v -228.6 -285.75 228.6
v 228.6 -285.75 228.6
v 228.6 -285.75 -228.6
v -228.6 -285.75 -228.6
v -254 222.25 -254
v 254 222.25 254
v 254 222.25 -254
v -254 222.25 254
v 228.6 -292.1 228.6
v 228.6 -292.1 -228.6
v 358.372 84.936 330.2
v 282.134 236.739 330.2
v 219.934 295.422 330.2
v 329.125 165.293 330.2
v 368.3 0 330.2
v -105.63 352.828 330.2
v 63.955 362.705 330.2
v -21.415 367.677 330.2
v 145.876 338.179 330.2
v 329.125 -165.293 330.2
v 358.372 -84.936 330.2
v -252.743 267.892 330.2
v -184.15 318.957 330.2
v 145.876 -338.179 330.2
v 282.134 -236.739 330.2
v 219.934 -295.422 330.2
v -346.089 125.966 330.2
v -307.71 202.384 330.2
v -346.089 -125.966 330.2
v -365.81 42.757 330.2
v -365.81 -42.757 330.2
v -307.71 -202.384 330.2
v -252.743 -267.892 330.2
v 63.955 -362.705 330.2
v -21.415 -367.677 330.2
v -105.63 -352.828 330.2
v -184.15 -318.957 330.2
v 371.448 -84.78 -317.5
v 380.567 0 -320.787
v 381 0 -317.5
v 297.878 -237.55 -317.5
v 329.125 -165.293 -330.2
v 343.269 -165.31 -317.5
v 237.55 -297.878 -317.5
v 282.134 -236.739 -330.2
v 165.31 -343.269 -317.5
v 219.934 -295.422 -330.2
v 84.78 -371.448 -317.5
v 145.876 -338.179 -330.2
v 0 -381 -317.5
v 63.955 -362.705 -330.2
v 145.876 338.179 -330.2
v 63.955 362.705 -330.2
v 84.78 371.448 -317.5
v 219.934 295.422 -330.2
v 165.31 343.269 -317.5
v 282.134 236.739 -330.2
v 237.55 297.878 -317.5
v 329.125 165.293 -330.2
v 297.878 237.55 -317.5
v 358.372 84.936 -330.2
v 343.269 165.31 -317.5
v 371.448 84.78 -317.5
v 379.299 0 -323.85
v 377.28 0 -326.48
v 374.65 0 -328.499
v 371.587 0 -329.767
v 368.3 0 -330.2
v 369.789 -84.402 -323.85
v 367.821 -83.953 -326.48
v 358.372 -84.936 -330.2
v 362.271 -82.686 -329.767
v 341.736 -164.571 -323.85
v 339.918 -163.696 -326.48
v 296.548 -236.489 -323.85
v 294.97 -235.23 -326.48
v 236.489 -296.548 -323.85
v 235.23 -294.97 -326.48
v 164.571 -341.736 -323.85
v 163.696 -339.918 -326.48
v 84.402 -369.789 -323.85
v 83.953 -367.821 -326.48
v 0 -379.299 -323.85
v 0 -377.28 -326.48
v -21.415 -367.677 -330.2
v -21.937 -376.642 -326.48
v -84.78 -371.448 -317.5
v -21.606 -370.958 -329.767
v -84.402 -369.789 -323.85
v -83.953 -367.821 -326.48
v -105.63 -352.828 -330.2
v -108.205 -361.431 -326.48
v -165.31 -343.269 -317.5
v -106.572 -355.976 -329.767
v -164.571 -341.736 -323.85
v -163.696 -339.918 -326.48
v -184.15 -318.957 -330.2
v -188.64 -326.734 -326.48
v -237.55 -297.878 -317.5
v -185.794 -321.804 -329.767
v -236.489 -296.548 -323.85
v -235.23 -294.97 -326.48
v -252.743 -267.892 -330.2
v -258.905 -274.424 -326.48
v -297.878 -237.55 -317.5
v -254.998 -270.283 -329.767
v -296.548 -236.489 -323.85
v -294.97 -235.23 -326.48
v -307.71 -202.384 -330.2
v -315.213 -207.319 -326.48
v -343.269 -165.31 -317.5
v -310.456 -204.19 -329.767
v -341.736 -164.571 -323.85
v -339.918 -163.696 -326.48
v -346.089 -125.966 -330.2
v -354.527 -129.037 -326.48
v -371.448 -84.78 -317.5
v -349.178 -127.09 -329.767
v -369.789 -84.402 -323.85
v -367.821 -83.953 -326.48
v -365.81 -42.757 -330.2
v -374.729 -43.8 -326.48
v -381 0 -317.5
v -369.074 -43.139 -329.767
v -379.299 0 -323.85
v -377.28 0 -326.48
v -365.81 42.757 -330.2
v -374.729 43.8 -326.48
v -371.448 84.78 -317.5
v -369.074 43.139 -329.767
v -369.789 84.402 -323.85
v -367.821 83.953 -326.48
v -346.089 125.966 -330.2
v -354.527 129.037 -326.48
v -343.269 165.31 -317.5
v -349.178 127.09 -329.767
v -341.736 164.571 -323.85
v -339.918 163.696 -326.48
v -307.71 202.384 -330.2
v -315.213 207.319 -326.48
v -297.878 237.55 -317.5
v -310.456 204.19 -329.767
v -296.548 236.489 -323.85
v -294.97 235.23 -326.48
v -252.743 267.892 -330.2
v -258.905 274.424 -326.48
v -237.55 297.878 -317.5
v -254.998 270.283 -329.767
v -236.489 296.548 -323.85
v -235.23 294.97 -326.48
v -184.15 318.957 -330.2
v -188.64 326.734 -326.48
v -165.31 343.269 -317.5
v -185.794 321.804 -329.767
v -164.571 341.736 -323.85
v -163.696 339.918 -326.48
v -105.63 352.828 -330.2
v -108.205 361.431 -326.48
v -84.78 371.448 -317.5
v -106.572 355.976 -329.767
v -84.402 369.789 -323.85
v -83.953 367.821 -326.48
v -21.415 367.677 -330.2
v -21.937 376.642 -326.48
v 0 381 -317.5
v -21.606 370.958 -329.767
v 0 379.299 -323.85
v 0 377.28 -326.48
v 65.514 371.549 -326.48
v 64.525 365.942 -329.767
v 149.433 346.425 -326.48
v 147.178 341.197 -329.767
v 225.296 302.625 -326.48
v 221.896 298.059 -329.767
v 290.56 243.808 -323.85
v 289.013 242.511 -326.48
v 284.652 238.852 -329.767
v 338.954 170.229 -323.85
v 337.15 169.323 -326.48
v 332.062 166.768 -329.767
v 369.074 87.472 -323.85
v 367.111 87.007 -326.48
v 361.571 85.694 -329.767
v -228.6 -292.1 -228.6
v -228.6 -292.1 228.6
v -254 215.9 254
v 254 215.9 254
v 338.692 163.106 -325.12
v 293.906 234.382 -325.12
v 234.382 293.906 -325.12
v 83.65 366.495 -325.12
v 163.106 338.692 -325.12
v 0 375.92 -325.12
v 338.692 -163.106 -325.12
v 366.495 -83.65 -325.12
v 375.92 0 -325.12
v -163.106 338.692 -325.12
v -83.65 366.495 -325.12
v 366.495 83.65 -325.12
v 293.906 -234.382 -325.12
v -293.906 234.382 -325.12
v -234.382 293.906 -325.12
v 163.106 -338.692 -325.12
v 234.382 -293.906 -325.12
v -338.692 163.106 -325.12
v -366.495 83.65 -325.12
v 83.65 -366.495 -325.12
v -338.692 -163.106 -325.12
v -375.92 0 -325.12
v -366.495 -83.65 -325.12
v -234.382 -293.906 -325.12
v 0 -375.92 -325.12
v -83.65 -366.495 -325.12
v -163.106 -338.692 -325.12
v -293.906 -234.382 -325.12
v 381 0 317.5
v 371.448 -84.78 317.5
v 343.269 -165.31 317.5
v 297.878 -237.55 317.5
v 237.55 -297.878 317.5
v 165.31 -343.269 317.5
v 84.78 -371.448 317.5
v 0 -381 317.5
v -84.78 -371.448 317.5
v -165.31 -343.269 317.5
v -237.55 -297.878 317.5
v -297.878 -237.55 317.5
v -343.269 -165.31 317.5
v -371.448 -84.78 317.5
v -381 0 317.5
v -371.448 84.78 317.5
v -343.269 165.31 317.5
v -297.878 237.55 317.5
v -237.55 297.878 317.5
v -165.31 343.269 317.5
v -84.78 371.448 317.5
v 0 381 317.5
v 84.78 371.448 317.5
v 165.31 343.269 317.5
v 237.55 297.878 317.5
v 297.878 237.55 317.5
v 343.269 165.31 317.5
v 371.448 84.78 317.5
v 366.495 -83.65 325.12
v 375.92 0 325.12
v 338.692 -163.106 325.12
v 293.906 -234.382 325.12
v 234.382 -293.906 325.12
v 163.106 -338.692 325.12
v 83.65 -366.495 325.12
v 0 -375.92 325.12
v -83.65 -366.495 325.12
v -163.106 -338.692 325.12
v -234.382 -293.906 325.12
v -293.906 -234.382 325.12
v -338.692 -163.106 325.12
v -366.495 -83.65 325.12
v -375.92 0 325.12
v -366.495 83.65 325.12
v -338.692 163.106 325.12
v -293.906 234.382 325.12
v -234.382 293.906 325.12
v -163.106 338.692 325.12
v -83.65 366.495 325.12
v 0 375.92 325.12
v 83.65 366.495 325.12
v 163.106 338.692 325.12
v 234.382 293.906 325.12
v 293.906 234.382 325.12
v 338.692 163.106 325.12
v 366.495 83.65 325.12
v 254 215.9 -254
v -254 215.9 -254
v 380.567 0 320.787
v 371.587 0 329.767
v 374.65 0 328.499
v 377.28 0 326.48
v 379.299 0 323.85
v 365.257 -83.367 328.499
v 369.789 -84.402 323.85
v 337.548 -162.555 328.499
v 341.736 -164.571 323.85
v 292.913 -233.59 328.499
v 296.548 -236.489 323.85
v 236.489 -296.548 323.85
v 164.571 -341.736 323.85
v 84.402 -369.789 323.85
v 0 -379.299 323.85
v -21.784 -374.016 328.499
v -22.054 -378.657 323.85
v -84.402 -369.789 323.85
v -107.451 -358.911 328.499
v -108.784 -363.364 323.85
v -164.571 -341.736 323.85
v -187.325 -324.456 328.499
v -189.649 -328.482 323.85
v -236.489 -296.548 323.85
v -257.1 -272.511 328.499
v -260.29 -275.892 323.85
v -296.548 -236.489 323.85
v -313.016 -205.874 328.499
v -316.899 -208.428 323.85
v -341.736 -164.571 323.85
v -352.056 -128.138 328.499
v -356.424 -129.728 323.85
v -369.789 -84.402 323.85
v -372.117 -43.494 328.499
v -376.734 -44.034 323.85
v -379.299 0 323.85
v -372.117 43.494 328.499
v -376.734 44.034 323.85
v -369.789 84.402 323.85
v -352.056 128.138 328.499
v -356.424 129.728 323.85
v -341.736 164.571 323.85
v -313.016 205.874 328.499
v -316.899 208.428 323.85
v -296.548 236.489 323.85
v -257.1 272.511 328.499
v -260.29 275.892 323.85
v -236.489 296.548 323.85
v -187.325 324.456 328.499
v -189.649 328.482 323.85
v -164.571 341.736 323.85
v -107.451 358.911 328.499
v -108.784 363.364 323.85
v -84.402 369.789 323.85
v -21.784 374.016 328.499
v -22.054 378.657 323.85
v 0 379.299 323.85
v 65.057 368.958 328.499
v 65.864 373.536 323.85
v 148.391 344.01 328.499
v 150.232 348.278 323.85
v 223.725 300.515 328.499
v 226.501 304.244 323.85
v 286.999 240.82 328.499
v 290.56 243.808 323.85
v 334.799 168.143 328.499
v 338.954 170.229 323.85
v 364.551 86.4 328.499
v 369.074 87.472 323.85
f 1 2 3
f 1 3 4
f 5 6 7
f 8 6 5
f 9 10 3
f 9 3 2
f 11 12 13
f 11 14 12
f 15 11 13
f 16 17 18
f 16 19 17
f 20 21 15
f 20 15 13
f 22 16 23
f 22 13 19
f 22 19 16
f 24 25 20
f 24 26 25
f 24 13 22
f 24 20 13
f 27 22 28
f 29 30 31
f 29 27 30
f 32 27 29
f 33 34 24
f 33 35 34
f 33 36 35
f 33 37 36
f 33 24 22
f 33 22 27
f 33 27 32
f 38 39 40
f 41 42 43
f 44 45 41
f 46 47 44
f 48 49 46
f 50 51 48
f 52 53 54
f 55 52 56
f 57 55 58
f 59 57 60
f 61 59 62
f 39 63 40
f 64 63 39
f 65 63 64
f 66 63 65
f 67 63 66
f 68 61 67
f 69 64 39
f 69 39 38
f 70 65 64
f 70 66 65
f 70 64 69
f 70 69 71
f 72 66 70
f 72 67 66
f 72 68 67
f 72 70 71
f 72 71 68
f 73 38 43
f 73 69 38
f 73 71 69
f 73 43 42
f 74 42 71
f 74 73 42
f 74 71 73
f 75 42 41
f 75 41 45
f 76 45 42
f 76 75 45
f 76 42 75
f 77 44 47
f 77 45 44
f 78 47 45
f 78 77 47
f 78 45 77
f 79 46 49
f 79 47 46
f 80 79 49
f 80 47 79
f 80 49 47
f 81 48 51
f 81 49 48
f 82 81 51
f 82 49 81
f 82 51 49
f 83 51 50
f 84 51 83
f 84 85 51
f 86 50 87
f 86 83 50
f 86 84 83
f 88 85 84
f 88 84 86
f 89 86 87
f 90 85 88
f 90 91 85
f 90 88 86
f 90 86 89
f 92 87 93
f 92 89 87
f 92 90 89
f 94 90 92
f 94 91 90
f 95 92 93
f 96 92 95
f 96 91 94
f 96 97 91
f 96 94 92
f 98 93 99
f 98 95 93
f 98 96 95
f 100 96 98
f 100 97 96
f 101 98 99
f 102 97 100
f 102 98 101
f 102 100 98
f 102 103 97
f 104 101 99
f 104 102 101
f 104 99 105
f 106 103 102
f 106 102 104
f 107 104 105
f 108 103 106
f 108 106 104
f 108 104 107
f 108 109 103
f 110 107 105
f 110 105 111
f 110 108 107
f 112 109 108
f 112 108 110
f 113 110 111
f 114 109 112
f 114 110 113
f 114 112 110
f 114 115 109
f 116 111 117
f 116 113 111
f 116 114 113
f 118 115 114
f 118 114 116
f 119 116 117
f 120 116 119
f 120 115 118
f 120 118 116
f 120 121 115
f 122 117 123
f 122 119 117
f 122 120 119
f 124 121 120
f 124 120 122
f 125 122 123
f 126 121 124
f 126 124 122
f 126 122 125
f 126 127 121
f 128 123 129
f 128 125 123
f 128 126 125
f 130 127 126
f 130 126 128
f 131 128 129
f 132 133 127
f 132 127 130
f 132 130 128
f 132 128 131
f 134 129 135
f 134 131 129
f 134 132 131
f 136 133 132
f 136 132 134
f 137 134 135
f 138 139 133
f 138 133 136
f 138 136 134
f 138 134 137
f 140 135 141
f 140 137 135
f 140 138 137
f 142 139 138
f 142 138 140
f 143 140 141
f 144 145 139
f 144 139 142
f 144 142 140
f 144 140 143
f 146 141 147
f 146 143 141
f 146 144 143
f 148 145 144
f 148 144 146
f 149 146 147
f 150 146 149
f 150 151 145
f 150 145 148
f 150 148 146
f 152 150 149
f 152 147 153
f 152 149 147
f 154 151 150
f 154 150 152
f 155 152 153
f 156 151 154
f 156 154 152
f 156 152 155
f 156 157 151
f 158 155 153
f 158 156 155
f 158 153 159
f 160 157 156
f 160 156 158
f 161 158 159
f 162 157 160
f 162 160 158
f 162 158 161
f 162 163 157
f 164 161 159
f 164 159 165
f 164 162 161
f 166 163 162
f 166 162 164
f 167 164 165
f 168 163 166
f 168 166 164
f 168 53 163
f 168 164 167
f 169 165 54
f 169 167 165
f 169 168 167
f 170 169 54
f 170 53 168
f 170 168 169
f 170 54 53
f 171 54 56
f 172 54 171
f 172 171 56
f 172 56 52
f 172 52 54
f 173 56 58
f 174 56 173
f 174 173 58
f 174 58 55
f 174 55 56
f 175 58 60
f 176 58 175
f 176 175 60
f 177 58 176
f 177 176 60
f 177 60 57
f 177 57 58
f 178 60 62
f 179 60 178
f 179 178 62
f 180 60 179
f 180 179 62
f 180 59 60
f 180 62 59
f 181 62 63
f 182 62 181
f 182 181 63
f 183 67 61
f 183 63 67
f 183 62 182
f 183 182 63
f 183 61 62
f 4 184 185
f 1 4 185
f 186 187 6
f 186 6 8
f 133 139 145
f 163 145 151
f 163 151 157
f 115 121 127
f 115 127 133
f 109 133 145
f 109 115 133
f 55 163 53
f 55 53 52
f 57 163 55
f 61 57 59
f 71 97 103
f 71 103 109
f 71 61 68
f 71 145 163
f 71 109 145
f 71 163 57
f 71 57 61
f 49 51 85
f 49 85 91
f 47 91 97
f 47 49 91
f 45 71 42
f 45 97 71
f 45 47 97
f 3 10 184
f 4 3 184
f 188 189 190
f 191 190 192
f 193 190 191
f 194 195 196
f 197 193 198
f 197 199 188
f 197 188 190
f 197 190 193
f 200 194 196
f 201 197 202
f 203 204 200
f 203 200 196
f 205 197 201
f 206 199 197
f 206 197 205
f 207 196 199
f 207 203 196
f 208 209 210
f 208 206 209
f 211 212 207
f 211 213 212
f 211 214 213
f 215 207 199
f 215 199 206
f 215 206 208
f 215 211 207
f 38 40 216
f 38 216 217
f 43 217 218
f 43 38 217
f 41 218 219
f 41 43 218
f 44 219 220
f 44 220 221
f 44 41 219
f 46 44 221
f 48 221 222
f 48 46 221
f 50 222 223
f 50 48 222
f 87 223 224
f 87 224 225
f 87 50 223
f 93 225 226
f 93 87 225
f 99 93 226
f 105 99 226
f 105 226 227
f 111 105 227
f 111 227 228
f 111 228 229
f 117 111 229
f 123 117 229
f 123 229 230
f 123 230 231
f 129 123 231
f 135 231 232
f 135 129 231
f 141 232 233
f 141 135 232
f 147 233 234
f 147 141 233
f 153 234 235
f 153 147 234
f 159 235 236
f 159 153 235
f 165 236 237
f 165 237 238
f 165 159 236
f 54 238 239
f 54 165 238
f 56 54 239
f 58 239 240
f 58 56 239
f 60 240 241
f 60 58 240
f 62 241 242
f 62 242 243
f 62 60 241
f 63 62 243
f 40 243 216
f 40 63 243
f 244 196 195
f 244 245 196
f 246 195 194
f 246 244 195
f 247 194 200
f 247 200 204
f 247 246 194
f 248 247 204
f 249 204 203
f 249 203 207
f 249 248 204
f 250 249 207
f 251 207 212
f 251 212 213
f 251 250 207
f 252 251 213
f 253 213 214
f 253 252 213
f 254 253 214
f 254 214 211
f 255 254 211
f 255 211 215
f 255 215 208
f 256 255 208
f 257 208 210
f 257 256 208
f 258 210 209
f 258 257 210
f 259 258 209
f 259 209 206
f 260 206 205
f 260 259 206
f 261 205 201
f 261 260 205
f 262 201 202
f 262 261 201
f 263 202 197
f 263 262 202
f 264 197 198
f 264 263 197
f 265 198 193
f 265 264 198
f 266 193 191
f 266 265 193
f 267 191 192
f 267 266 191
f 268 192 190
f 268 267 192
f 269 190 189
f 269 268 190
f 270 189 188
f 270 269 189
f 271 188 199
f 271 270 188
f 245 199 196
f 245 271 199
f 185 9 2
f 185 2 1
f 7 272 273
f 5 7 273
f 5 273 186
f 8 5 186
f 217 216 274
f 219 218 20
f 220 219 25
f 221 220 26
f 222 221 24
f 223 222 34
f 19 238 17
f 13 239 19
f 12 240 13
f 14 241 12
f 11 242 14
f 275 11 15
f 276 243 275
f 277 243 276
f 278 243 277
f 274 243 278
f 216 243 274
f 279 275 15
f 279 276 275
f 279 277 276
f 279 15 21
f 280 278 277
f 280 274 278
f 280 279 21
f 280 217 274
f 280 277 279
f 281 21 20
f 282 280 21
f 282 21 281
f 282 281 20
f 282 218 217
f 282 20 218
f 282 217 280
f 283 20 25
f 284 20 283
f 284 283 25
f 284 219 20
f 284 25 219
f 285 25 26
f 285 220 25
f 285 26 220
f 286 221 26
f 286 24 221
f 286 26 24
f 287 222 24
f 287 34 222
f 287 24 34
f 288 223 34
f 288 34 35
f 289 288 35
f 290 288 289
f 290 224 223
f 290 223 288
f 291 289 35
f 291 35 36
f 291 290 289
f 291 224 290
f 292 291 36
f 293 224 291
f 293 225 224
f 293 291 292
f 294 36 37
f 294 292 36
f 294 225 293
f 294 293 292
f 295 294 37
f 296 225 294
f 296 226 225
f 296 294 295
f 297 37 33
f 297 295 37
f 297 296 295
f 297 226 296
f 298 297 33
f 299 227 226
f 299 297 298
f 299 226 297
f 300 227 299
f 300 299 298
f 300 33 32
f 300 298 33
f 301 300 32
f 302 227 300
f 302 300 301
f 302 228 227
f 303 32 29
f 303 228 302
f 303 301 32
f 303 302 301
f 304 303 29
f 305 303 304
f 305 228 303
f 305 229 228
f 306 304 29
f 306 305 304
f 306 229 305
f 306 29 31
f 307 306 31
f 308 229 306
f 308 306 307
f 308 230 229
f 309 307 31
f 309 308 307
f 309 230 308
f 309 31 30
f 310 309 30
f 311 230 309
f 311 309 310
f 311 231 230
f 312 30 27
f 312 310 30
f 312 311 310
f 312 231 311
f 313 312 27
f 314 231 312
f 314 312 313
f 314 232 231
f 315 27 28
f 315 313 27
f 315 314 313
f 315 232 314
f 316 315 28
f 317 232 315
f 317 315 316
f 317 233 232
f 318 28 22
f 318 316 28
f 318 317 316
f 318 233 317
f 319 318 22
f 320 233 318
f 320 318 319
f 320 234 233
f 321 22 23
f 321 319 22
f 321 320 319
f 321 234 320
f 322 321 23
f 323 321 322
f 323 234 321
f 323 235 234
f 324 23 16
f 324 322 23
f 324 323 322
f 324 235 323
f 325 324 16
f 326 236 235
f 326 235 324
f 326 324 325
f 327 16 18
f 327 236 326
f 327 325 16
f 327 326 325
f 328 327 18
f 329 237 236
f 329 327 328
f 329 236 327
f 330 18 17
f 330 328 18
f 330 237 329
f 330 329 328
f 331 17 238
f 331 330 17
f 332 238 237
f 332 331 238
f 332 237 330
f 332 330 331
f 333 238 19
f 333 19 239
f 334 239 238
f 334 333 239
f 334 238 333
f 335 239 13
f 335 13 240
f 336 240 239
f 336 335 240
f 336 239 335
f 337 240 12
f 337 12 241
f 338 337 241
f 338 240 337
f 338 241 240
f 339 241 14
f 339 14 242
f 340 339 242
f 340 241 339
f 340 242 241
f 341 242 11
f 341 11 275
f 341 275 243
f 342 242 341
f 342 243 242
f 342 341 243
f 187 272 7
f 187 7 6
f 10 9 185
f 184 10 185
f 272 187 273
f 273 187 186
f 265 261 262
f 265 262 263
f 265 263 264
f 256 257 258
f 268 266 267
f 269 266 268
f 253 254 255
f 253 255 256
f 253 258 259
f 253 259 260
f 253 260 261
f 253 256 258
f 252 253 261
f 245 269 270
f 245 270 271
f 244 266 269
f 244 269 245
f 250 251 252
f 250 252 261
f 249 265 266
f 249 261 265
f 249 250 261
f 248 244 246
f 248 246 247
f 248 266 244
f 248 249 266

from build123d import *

# Parameters (mm, degrees)
FILLET1_R           = 12.7
SKETCH4_W           = 508
SKETCH4_H           = 508
BOSS_EXTRUDE1_DEPTH = 6.35
SKETCH5_W           = 457.2
SKETCH5_H           = 457.2
BOSS_EXTRUDE2_DEPTH = 6.35


with BuildPart() as part:
    # Sketch2 → Revolve1 (revolve)
    with BuildSketch(Plane(origin=(0, 0, 0), x_dir=(0, 0, -1), z_dir=(1, 0, 0)), mode=Mode.PRIVATE) as revolve1_sk:
        Polygon((-330.2, 0), (-330.2, 381), (330.2, 381), (330.2, 0), (325.12, 0), (325.12, 375.92), (-325.12, 375.92), (-325.12, 0), align=None)
    revolve(revolve1_sk.sketch.rotate(Axis((0, 0, 330.2), (0, 0, -1)), 90), axis=Axis((0, 0, 330.2), (0, 0, -1)))

    # Fillet1
    fillet1_edges = [part.edges().sort_by_distance(p)[0] for p in [
        (-381, 0, 330.2),
        (-381, 0, -330.2),
    ]]
    fillet(fillet1_edges, radius=FILLET1_R)


with BuildPart() as body_2:
    # Sketch4 → Boss-Extrude1 (new body)
    with BuildSketch(Plane(origin=(0, 215.9, 0), x_dir=(-1, 0, 0), z_dir=(0, 1, 0))):
        Rectangle(SKETCH4_W, SKETCH4_H)
    extrude(amount=BOSS_EXTRUDE1_DEPTH)


with BuildPart() as body_3:
    # Sketch5 → Boss-Extrude2 (new body)
    with BuildSketch(Plane(origin=(0, -292.1, 0), x_dir=(-1, 0, 0), z_dir=(0, 1, 0))):
        Rectangle(SKETCH5_W, SKETCH5_H)
    extrude(amount=BOSS_EXTRUDE2_DEPTH)


solid = Compound([part.part, body_2.part, body_3.part])
